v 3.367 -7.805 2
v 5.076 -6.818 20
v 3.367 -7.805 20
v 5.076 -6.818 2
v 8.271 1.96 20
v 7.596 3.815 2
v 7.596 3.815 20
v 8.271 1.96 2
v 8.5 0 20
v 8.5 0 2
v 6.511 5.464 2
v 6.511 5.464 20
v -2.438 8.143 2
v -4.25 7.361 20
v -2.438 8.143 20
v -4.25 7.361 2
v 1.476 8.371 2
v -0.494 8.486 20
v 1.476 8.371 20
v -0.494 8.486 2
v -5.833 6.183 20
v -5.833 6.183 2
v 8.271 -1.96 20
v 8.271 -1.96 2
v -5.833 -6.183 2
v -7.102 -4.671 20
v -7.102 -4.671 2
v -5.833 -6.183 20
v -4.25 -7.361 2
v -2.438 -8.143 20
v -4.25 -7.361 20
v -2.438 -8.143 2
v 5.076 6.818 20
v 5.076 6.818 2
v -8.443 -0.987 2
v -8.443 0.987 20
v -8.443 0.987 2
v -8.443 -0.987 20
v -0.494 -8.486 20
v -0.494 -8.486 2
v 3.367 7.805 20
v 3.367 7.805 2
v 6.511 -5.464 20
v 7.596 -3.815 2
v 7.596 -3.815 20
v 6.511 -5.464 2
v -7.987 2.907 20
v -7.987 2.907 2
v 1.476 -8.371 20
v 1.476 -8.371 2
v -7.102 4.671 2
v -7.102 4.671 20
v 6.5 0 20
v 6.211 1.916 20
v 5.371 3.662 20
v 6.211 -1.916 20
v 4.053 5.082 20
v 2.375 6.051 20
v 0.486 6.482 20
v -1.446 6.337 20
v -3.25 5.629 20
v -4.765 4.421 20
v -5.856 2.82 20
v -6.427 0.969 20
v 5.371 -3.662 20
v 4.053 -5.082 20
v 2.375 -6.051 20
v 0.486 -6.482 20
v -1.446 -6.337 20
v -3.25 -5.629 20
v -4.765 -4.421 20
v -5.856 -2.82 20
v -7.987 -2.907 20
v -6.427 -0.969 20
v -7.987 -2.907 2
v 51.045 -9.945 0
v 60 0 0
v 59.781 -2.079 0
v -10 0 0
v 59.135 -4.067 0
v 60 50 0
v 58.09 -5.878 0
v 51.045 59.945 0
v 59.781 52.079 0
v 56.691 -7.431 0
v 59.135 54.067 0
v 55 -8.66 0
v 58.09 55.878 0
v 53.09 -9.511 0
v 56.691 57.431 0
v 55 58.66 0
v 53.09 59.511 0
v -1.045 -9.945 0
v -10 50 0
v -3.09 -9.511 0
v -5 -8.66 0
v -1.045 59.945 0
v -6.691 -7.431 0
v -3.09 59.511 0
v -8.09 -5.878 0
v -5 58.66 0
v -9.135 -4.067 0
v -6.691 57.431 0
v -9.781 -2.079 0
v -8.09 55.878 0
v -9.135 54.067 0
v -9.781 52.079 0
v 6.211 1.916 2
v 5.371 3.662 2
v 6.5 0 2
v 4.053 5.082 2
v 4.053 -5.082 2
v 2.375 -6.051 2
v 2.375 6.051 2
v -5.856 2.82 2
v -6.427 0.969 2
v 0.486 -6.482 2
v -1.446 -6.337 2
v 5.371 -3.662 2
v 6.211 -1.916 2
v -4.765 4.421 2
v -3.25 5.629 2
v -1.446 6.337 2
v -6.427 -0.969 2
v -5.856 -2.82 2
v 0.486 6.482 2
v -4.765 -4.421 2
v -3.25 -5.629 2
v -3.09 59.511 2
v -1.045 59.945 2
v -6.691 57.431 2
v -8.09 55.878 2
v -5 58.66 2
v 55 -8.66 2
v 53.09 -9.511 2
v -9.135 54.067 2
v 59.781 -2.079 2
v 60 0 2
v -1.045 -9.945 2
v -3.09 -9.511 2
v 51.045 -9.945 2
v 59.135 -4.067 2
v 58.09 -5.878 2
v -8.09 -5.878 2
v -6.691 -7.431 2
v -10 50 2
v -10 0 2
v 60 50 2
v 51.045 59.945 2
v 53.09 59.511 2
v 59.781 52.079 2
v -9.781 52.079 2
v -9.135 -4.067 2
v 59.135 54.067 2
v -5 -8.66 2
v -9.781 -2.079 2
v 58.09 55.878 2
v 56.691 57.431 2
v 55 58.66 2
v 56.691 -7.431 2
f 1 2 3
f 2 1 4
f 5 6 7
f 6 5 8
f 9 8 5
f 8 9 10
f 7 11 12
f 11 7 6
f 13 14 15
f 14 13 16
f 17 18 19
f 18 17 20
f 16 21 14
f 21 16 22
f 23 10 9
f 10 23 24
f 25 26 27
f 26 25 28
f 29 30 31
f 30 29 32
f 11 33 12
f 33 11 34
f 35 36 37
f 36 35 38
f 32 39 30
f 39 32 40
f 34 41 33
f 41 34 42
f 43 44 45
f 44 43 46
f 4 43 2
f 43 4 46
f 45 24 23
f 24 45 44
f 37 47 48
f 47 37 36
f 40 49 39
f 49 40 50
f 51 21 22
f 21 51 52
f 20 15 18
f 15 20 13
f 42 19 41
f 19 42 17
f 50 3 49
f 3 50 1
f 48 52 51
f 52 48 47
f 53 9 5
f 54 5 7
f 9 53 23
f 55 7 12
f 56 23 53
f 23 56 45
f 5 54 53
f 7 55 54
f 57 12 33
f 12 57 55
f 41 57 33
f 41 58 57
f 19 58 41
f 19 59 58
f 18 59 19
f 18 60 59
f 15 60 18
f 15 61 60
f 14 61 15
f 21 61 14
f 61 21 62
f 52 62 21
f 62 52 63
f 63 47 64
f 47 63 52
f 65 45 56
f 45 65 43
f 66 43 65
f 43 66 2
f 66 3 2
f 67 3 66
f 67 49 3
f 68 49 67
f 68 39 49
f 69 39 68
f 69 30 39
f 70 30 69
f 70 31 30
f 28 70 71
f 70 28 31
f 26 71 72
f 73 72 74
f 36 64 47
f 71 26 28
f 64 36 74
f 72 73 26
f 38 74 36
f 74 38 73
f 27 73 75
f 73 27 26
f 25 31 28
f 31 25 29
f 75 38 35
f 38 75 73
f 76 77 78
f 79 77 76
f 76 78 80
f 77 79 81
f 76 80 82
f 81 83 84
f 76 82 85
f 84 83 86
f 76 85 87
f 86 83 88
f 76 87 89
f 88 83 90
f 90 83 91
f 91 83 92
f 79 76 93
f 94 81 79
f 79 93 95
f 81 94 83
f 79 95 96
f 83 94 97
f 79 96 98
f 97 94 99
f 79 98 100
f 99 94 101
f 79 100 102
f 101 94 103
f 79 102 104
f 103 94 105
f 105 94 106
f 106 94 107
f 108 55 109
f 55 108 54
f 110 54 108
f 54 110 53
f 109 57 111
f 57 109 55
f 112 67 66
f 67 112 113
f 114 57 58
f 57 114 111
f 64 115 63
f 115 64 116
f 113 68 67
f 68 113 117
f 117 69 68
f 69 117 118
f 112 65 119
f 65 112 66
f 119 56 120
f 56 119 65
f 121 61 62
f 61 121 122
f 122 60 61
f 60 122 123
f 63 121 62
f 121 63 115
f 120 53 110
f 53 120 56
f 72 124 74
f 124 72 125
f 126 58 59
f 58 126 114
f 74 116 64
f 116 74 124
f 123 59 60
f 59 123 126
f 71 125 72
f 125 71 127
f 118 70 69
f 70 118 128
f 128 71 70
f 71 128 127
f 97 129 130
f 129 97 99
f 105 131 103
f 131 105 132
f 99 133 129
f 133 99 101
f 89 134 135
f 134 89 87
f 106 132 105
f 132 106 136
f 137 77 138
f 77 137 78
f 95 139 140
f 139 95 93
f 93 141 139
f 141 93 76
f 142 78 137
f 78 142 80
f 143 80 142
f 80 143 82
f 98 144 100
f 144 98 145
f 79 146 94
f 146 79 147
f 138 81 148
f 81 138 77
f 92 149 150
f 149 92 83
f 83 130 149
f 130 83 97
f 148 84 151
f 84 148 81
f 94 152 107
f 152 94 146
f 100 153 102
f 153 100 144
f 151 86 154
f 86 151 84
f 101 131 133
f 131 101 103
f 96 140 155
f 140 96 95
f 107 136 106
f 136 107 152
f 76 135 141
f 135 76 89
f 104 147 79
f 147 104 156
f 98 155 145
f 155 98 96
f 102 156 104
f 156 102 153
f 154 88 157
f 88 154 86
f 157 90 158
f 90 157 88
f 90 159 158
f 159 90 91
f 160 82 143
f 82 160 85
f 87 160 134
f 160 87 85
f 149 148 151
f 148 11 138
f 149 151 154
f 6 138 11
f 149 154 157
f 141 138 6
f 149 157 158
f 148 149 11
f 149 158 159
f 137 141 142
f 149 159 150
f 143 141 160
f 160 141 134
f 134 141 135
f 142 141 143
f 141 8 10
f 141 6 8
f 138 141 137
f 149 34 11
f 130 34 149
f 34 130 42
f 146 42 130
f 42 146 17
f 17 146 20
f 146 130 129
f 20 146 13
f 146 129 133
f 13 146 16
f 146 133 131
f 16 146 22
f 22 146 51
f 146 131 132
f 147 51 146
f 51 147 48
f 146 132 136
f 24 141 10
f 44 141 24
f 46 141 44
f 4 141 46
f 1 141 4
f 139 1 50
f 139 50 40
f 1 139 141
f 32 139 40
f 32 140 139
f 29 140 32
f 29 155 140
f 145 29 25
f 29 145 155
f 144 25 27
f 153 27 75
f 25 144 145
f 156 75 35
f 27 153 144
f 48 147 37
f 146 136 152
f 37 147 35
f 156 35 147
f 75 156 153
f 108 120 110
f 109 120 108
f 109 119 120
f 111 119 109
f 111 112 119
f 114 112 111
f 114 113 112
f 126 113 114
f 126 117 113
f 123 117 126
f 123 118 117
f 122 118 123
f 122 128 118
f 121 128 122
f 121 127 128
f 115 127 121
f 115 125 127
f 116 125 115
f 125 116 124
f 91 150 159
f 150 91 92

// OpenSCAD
height=20;
outerDiameter=17;
innerDiameter=13;
shaderSize=50;
shaderRadius=20;
shaderThickness=2;


difference() {
    cylinder(d=outerDiameter, h=height);
    cylinder(d=innerDiameter, h=height);
} 
hull() {
    cylinder(d=shaderRadius, h=shaderThickness);
    translate([shaderSize, 0, 0]) cylinder(d=shaderRadius, h=shaderThickness);
    translate([0, shaderSize, 0]) cylinder(d=shaderRadius, h=shaderThickness);
    translate([shaderSize, shaderSize, 0]) cylinder(d=shaderRadius, h=shaderThickness);
}
